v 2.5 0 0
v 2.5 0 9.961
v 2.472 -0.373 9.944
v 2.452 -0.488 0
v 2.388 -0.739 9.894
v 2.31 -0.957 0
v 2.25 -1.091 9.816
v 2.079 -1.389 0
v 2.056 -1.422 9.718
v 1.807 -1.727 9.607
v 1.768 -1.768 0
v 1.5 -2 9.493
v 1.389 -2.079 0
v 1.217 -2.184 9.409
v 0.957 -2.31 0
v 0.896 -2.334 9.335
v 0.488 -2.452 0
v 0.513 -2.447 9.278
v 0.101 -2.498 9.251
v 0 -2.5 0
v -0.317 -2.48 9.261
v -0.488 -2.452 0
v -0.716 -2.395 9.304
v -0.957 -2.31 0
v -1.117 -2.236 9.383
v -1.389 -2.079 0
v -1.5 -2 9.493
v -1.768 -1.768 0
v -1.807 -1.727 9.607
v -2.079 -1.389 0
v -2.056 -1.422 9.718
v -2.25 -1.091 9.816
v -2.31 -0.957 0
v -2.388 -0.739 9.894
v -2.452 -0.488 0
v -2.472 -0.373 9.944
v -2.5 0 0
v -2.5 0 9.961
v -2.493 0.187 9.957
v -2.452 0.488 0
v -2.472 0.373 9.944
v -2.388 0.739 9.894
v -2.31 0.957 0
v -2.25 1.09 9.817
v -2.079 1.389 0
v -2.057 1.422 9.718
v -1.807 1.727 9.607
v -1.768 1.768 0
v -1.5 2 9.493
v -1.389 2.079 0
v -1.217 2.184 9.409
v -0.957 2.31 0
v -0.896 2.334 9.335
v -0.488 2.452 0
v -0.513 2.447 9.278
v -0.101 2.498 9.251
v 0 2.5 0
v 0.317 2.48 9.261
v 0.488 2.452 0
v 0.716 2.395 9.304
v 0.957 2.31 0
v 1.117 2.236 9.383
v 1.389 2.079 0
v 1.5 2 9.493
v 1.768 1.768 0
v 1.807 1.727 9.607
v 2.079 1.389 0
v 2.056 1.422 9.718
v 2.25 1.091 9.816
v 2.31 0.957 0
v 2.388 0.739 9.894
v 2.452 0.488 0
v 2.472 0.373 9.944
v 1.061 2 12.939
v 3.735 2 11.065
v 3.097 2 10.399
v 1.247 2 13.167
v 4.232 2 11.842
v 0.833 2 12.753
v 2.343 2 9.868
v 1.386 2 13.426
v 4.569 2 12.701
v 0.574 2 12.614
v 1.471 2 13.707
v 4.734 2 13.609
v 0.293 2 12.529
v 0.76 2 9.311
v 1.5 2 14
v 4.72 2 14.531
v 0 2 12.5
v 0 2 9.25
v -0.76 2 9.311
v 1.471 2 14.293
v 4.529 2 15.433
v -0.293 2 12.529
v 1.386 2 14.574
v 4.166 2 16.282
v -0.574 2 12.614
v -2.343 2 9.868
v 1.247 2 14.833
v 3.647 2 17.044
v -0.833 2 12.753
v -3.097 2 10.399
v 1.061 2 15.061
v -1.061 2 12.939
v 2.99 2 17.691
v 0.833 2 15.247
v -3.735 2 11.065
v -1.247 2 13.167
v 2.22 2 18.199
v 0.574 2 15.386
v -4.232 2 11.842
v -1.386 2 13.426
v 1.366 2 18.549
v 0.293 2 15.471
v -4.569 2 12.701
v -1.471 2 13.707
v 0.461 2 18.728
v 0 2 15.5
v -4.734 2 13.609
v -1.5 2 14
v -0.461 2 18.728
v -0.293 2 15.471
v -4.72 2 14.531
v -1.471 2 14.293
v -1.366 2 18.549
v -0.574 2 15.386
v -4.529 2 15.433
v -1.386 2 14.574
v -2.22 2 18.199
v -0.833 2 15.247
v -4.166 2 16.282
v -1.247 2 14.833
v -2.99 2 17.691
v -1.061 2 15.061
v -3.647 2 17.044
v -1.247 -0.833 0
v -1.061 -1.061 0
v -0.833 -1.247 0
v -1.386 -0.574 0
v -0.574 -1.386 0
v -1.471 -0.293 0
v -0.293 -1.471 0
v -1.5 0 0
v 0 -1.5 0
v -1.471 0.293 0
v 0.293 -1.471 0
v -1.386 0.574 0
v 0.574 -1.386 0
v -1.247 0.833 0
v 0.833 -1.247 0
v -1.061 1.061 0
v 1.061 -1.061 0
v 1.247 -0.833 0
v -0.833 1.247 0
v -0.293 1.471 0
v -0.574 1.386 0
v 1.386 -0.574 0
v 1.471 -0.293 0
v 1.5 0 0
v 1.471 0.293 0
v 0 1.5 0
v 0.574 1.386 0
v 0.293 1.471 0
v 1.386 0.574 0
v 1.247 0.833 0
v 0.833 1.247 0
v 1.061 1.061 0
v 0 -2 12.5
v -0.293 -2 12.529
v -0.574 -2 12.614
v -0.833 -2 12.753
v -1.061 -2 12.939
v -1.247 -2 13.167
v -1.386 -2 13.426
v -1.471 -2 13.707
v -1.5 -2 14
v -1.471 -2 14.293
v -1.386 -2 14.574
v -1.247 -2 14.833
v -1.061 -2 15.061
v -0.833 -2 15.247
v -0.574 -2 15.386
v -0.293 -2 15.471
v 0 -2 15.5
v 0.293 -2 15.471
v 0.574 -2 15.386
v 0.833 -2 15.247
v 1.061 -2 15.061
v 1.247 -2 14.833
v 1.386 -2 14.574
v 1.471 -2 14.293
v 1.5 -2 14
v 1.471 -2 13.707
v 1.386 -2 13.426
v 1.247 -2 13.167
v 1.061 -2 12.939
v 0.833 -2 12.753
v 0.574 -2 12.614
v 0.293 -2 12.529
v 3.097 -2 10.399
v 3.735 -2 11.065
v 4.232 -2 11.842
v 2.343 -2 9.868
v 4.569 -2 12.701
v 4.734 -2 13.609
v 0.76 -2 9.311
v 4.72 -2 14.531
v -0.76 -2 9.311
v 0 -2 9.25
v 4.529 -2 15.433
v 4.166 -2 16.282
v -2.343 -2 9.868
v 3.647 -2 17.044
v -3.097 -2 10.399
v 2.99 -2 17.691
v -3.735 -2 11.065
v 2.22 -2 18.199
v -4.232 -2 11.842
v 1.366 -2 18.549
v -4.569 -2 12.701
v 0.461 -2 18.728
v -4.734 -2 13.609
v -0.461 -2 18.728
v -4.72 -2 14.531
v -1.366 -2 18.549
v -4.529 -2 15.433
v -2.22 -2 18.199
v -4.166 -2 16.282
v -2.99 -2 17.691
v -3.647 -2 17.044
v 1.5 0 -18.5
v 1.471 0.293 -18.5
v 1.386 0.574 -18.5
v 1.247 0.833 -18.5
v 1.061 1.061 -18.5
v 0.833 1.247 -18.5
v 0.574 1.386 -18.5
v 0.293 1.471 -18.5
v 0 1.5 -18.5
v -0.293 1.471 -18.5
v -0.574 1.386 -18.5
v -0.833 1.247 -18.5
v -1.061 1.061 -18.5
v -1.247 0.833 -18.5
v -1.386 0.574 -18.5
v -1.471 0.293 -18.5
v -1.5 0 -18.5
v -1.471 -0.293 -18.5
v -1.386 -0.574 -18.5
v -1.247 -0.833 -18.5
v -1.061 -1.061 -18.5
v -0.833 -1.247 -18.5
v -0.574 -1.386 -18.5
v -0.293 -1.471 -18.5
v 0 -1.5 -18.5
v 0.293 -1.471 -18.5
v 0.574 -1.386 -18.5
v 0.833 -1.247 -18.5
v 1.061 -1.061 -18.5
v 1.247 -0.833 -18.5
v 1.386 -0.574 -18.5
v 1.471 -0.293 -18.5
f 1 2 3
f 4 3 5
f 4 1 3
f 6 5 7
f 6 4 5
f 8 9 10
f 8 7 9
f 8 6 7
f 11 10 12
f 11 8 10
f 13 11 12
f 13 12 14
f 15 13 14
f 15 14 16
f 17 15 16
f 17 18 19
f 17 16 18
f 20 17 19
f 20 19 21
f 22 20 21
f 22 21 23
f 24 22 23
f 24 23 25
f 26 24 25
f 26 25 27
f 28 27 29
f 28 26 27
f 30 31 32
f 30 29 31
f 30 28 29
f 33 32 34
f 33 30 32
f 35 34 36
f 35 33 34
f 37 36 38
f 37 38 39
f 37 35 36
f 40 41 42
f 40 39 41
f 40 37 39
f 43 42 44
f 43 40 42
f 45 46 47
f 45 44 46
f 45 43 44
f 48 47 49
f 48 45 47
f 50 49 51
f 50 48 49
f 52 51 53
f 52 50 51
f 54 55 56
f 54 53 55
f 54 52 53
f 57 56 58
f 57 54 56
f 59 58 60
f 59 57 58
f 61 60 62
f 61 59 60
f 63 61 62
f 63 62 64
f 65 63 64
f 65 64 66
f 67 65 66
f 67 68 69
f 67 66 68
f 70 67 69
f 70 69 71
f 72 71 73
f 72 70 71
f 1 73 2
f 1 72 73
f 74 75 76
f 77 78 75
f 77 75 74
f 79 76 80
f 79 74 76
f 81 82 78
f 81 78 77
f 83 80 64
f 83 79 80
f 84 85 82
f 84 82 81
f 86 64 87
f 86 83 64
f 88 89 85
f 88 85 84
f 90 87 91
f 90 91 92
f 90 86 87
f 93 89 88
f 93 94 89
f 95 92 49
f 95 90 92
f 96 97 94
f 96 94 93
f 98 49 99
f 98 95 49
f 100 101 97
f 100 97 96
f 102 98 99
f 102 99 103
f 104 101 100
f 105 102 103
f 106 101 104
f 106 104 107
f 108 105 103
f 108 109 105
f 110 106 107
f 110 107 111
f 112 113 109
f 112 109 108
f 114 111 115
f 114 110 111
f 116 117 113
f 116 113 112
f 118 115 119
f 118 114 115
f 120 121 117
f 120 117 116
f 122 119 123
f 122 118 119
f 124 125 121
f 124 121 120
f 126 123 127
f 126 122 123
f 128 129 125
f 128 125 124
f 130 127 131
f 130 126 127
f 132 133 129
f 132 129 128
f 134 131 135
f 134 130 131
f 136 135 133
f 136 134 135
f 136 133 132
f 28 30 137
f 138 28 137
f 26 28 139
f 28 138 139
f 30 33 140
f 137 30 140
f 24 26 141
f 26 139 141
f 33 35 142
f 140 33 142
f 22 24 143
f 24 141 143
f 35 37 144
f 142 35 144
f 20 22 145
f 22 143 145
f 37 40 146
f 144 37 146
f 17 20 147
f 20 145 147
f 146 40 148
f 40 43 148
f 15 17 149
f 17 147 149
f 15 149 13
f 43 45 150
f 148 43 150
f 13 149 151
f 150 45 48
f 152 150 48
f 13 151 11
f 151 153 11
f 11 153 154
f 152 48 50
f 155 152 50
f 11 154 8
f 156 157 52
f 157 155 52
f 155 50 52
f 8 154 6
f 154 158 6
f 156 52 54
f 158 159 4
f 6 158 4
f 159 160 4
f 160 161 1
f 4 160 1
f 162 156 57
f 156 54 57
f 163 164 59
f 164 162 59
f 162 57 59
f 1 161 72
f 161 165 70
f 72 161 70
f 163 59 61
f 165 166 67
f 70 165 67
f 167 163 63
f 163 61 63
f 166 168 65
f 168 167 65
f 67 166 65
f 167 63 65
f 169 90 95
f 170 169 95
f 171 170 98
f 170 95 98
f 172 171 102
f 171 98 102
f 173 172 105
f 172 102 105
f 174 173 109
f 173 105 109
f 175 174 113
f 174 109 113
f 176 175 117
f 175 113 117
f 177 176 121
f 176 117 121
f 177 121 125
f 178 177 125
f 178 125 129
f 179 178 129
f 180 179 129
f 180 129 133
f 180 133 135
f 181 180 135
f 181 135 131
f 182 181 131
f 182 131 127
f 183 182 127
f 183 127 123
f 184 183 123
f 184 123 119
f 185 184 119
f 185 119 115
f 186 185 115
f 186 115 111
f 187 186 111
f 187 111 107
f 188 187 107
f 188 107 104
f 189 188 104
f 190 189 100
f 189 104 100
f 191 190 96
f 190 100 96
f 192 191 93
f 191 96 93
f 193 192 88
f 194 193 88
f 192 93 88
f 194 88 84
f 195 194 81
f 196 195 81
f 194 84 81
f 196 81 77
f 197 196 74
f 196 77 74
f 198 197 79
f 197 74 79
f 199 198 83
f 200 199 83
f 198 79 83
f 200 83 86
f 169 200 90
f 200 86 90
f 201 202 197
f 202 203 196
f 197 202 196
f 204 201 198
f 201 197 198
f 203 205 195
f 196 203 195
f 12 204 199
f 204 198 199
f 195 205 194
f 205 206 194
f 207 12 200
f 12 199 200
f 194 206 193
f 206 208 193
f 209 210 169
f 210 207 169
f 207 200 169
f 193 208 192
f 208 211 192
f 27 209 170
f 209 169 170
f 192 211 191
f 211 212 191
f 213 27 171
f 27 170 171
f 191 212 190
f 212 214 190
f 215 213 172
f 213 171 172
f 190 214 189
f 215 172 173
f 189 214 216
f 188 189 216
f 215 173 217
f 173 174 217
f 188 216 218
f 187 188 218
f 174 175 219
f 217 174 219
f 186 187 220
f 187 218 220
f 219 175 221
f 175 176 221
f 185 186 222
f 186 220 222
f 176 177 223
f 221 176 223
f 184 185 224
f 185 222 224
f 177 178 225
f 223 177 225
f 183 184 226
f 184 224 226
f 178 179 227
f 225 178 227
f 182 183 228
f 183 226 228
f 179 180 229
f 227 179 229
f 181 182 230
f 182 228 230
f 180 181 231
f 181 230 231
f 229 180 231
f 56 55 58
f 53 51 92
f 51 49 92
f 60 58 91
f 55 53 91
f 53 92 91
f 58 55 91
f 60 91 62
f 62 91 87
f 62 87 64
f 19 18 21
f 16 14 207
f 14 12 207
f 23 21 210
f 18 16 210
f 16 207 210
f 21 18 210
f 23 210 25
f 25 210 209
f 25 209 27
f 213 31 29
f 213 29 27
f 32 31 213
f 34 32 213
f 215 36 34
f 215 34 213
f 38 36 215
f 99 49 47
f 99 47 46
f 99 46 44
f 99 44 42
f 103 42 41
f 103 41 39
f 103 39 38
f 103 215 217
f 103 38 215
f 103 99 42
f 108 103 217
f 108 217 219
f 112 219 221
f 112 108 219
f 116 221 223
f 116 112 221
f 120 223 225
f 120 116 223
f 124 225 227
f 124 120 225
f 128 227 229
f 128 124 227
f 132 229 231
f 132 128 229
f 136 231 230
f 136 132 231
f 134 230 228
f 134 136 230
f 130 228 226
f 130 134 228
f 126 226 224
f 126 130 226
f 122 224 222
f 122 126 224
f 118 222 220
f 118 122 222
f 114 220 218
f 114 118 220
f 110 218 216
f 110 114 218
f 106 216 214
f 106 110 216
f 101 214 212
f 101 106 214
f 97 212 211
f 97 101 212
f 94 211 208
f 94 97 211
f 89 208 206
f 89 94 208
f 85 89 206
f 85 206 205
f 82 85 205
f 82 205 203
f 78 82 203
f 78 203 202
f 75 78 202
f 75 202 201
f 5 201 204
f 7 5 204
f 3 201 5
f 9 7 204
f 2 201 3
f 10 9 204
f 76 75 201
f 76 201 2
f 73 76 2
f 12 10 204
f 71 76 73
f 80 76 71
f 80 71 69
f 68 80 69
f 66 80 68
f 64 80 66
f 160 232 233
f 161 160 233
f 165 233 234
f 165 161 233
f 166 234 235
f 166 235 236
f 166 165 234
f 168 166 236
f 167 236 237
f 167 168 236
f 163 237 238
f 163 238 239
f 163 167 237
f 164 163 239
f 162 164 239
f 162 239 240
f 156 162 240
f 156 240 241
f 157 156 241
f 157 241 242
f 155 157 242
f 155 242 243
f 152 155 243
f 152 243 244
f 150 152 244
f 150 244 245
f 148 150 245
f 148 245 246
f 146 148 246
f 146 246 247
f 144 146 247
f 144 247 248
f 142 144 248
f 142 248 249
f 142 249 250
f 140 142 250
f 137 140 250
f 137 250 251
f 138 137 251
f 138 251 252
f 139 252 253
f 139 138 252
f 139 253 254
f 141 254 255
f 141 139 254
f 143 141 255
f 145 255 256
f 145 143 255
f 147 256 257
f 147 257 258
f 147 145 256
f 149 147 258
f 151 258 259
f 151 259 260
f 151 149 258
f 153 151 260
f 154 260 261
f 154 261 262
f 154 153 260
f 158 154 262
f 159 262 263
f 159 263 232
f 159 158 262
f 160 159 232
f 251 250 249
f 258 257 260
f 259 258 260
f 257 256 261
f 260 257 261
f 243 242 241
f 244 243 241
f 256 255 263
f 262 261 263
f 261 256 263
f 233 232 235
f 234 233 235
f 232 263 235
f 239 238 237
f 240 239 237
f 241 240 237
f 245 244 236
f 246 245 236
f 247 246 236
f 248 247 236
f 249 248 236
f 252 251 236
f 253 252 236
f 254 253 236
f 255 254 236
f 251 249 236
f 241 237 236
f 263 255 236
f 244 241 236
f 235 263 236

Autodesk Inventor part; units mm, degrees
ref_plane "YZ Plane" through (0, 0, 0) normal (1, 0, 0) x (0, 1, 0)
ref_plane "XZ Plane" through (0, 0, 0) normal (0, 1, 0) x (-1, 0, 0)
sketch "スケッチ1" plane through (0, 0, 0) normal (0, 0, 1) x (1, 0, 0)
  circle A0 centre (0, 0) radius 1.5
  circle A1 centre (0, 0) radius 2.5
  line L0 (0, 0) -> (0, 2.5)
  dimension "d1" = 5
  dimension "d0" = 3
extrude "押し出し1" add sketch "スケッチ1" along normal blind 14 contours A0 | A1
extrude "押し出し2" add sketch "スケッチ1" against normal blind 18.5 contours A0
ref_plane "作業平面1" through (0, 0, 0) normal (0, 1, 0) x (-1, 0, 0)
sketch "スケッチ2" plane through (0, 0, 0) normal (0, 1, 0) x (-1, 0, 0)
  line L0 (2.5, 14) -> (-2.5, 14) projected
  circle A0 centre (0, 14) radius 4.75
  point P0 (0, 0)
  dimension "d6" = 9.5
extrude "押し出し3" add sketch "スケッチ2" along normal mid plane 4
sketch "スケッチ3" plane through (0, 2, 0) normal (0, 1, 0) x (1, 0, 0)
  line L0 (-1.5, -14) -> (1.5, -14) projected
  circle A0 centre (0, -14) radius 4.75
  point P0 (0, 0)
  dimension "d9" = 9.5
extrude "押し出し4" cut sketch "スケッチ3" along normal blind 4
sketch "スケッチ4" plane through (0, -2, 0) normal (0, -1, 0) x (1, 0, 0)
  line L0 (1.5, 14) -> (-1.5, 14) projected
  circle A0 centre (0, 14) radius 4.75
  point P0 (0, 0)
  dimension "d12" = 9.5
extrude "押し出し5" cut sketch "スケッチ4" along normal blind 4
hole "穴1" at (0, -2, 14) direction (0, 1, 0) diameter 3 end through all
sketch "スケッチ5" plane through (0, 0, 0) normal (0, 0, -1) x (-1, 0, 0)
  circle A0 centre (0, 0) radius 2.5 projected
  circle A1 centre (0, 0) radius 1.5 projected
properties part number "ダンパー下パーツ"
